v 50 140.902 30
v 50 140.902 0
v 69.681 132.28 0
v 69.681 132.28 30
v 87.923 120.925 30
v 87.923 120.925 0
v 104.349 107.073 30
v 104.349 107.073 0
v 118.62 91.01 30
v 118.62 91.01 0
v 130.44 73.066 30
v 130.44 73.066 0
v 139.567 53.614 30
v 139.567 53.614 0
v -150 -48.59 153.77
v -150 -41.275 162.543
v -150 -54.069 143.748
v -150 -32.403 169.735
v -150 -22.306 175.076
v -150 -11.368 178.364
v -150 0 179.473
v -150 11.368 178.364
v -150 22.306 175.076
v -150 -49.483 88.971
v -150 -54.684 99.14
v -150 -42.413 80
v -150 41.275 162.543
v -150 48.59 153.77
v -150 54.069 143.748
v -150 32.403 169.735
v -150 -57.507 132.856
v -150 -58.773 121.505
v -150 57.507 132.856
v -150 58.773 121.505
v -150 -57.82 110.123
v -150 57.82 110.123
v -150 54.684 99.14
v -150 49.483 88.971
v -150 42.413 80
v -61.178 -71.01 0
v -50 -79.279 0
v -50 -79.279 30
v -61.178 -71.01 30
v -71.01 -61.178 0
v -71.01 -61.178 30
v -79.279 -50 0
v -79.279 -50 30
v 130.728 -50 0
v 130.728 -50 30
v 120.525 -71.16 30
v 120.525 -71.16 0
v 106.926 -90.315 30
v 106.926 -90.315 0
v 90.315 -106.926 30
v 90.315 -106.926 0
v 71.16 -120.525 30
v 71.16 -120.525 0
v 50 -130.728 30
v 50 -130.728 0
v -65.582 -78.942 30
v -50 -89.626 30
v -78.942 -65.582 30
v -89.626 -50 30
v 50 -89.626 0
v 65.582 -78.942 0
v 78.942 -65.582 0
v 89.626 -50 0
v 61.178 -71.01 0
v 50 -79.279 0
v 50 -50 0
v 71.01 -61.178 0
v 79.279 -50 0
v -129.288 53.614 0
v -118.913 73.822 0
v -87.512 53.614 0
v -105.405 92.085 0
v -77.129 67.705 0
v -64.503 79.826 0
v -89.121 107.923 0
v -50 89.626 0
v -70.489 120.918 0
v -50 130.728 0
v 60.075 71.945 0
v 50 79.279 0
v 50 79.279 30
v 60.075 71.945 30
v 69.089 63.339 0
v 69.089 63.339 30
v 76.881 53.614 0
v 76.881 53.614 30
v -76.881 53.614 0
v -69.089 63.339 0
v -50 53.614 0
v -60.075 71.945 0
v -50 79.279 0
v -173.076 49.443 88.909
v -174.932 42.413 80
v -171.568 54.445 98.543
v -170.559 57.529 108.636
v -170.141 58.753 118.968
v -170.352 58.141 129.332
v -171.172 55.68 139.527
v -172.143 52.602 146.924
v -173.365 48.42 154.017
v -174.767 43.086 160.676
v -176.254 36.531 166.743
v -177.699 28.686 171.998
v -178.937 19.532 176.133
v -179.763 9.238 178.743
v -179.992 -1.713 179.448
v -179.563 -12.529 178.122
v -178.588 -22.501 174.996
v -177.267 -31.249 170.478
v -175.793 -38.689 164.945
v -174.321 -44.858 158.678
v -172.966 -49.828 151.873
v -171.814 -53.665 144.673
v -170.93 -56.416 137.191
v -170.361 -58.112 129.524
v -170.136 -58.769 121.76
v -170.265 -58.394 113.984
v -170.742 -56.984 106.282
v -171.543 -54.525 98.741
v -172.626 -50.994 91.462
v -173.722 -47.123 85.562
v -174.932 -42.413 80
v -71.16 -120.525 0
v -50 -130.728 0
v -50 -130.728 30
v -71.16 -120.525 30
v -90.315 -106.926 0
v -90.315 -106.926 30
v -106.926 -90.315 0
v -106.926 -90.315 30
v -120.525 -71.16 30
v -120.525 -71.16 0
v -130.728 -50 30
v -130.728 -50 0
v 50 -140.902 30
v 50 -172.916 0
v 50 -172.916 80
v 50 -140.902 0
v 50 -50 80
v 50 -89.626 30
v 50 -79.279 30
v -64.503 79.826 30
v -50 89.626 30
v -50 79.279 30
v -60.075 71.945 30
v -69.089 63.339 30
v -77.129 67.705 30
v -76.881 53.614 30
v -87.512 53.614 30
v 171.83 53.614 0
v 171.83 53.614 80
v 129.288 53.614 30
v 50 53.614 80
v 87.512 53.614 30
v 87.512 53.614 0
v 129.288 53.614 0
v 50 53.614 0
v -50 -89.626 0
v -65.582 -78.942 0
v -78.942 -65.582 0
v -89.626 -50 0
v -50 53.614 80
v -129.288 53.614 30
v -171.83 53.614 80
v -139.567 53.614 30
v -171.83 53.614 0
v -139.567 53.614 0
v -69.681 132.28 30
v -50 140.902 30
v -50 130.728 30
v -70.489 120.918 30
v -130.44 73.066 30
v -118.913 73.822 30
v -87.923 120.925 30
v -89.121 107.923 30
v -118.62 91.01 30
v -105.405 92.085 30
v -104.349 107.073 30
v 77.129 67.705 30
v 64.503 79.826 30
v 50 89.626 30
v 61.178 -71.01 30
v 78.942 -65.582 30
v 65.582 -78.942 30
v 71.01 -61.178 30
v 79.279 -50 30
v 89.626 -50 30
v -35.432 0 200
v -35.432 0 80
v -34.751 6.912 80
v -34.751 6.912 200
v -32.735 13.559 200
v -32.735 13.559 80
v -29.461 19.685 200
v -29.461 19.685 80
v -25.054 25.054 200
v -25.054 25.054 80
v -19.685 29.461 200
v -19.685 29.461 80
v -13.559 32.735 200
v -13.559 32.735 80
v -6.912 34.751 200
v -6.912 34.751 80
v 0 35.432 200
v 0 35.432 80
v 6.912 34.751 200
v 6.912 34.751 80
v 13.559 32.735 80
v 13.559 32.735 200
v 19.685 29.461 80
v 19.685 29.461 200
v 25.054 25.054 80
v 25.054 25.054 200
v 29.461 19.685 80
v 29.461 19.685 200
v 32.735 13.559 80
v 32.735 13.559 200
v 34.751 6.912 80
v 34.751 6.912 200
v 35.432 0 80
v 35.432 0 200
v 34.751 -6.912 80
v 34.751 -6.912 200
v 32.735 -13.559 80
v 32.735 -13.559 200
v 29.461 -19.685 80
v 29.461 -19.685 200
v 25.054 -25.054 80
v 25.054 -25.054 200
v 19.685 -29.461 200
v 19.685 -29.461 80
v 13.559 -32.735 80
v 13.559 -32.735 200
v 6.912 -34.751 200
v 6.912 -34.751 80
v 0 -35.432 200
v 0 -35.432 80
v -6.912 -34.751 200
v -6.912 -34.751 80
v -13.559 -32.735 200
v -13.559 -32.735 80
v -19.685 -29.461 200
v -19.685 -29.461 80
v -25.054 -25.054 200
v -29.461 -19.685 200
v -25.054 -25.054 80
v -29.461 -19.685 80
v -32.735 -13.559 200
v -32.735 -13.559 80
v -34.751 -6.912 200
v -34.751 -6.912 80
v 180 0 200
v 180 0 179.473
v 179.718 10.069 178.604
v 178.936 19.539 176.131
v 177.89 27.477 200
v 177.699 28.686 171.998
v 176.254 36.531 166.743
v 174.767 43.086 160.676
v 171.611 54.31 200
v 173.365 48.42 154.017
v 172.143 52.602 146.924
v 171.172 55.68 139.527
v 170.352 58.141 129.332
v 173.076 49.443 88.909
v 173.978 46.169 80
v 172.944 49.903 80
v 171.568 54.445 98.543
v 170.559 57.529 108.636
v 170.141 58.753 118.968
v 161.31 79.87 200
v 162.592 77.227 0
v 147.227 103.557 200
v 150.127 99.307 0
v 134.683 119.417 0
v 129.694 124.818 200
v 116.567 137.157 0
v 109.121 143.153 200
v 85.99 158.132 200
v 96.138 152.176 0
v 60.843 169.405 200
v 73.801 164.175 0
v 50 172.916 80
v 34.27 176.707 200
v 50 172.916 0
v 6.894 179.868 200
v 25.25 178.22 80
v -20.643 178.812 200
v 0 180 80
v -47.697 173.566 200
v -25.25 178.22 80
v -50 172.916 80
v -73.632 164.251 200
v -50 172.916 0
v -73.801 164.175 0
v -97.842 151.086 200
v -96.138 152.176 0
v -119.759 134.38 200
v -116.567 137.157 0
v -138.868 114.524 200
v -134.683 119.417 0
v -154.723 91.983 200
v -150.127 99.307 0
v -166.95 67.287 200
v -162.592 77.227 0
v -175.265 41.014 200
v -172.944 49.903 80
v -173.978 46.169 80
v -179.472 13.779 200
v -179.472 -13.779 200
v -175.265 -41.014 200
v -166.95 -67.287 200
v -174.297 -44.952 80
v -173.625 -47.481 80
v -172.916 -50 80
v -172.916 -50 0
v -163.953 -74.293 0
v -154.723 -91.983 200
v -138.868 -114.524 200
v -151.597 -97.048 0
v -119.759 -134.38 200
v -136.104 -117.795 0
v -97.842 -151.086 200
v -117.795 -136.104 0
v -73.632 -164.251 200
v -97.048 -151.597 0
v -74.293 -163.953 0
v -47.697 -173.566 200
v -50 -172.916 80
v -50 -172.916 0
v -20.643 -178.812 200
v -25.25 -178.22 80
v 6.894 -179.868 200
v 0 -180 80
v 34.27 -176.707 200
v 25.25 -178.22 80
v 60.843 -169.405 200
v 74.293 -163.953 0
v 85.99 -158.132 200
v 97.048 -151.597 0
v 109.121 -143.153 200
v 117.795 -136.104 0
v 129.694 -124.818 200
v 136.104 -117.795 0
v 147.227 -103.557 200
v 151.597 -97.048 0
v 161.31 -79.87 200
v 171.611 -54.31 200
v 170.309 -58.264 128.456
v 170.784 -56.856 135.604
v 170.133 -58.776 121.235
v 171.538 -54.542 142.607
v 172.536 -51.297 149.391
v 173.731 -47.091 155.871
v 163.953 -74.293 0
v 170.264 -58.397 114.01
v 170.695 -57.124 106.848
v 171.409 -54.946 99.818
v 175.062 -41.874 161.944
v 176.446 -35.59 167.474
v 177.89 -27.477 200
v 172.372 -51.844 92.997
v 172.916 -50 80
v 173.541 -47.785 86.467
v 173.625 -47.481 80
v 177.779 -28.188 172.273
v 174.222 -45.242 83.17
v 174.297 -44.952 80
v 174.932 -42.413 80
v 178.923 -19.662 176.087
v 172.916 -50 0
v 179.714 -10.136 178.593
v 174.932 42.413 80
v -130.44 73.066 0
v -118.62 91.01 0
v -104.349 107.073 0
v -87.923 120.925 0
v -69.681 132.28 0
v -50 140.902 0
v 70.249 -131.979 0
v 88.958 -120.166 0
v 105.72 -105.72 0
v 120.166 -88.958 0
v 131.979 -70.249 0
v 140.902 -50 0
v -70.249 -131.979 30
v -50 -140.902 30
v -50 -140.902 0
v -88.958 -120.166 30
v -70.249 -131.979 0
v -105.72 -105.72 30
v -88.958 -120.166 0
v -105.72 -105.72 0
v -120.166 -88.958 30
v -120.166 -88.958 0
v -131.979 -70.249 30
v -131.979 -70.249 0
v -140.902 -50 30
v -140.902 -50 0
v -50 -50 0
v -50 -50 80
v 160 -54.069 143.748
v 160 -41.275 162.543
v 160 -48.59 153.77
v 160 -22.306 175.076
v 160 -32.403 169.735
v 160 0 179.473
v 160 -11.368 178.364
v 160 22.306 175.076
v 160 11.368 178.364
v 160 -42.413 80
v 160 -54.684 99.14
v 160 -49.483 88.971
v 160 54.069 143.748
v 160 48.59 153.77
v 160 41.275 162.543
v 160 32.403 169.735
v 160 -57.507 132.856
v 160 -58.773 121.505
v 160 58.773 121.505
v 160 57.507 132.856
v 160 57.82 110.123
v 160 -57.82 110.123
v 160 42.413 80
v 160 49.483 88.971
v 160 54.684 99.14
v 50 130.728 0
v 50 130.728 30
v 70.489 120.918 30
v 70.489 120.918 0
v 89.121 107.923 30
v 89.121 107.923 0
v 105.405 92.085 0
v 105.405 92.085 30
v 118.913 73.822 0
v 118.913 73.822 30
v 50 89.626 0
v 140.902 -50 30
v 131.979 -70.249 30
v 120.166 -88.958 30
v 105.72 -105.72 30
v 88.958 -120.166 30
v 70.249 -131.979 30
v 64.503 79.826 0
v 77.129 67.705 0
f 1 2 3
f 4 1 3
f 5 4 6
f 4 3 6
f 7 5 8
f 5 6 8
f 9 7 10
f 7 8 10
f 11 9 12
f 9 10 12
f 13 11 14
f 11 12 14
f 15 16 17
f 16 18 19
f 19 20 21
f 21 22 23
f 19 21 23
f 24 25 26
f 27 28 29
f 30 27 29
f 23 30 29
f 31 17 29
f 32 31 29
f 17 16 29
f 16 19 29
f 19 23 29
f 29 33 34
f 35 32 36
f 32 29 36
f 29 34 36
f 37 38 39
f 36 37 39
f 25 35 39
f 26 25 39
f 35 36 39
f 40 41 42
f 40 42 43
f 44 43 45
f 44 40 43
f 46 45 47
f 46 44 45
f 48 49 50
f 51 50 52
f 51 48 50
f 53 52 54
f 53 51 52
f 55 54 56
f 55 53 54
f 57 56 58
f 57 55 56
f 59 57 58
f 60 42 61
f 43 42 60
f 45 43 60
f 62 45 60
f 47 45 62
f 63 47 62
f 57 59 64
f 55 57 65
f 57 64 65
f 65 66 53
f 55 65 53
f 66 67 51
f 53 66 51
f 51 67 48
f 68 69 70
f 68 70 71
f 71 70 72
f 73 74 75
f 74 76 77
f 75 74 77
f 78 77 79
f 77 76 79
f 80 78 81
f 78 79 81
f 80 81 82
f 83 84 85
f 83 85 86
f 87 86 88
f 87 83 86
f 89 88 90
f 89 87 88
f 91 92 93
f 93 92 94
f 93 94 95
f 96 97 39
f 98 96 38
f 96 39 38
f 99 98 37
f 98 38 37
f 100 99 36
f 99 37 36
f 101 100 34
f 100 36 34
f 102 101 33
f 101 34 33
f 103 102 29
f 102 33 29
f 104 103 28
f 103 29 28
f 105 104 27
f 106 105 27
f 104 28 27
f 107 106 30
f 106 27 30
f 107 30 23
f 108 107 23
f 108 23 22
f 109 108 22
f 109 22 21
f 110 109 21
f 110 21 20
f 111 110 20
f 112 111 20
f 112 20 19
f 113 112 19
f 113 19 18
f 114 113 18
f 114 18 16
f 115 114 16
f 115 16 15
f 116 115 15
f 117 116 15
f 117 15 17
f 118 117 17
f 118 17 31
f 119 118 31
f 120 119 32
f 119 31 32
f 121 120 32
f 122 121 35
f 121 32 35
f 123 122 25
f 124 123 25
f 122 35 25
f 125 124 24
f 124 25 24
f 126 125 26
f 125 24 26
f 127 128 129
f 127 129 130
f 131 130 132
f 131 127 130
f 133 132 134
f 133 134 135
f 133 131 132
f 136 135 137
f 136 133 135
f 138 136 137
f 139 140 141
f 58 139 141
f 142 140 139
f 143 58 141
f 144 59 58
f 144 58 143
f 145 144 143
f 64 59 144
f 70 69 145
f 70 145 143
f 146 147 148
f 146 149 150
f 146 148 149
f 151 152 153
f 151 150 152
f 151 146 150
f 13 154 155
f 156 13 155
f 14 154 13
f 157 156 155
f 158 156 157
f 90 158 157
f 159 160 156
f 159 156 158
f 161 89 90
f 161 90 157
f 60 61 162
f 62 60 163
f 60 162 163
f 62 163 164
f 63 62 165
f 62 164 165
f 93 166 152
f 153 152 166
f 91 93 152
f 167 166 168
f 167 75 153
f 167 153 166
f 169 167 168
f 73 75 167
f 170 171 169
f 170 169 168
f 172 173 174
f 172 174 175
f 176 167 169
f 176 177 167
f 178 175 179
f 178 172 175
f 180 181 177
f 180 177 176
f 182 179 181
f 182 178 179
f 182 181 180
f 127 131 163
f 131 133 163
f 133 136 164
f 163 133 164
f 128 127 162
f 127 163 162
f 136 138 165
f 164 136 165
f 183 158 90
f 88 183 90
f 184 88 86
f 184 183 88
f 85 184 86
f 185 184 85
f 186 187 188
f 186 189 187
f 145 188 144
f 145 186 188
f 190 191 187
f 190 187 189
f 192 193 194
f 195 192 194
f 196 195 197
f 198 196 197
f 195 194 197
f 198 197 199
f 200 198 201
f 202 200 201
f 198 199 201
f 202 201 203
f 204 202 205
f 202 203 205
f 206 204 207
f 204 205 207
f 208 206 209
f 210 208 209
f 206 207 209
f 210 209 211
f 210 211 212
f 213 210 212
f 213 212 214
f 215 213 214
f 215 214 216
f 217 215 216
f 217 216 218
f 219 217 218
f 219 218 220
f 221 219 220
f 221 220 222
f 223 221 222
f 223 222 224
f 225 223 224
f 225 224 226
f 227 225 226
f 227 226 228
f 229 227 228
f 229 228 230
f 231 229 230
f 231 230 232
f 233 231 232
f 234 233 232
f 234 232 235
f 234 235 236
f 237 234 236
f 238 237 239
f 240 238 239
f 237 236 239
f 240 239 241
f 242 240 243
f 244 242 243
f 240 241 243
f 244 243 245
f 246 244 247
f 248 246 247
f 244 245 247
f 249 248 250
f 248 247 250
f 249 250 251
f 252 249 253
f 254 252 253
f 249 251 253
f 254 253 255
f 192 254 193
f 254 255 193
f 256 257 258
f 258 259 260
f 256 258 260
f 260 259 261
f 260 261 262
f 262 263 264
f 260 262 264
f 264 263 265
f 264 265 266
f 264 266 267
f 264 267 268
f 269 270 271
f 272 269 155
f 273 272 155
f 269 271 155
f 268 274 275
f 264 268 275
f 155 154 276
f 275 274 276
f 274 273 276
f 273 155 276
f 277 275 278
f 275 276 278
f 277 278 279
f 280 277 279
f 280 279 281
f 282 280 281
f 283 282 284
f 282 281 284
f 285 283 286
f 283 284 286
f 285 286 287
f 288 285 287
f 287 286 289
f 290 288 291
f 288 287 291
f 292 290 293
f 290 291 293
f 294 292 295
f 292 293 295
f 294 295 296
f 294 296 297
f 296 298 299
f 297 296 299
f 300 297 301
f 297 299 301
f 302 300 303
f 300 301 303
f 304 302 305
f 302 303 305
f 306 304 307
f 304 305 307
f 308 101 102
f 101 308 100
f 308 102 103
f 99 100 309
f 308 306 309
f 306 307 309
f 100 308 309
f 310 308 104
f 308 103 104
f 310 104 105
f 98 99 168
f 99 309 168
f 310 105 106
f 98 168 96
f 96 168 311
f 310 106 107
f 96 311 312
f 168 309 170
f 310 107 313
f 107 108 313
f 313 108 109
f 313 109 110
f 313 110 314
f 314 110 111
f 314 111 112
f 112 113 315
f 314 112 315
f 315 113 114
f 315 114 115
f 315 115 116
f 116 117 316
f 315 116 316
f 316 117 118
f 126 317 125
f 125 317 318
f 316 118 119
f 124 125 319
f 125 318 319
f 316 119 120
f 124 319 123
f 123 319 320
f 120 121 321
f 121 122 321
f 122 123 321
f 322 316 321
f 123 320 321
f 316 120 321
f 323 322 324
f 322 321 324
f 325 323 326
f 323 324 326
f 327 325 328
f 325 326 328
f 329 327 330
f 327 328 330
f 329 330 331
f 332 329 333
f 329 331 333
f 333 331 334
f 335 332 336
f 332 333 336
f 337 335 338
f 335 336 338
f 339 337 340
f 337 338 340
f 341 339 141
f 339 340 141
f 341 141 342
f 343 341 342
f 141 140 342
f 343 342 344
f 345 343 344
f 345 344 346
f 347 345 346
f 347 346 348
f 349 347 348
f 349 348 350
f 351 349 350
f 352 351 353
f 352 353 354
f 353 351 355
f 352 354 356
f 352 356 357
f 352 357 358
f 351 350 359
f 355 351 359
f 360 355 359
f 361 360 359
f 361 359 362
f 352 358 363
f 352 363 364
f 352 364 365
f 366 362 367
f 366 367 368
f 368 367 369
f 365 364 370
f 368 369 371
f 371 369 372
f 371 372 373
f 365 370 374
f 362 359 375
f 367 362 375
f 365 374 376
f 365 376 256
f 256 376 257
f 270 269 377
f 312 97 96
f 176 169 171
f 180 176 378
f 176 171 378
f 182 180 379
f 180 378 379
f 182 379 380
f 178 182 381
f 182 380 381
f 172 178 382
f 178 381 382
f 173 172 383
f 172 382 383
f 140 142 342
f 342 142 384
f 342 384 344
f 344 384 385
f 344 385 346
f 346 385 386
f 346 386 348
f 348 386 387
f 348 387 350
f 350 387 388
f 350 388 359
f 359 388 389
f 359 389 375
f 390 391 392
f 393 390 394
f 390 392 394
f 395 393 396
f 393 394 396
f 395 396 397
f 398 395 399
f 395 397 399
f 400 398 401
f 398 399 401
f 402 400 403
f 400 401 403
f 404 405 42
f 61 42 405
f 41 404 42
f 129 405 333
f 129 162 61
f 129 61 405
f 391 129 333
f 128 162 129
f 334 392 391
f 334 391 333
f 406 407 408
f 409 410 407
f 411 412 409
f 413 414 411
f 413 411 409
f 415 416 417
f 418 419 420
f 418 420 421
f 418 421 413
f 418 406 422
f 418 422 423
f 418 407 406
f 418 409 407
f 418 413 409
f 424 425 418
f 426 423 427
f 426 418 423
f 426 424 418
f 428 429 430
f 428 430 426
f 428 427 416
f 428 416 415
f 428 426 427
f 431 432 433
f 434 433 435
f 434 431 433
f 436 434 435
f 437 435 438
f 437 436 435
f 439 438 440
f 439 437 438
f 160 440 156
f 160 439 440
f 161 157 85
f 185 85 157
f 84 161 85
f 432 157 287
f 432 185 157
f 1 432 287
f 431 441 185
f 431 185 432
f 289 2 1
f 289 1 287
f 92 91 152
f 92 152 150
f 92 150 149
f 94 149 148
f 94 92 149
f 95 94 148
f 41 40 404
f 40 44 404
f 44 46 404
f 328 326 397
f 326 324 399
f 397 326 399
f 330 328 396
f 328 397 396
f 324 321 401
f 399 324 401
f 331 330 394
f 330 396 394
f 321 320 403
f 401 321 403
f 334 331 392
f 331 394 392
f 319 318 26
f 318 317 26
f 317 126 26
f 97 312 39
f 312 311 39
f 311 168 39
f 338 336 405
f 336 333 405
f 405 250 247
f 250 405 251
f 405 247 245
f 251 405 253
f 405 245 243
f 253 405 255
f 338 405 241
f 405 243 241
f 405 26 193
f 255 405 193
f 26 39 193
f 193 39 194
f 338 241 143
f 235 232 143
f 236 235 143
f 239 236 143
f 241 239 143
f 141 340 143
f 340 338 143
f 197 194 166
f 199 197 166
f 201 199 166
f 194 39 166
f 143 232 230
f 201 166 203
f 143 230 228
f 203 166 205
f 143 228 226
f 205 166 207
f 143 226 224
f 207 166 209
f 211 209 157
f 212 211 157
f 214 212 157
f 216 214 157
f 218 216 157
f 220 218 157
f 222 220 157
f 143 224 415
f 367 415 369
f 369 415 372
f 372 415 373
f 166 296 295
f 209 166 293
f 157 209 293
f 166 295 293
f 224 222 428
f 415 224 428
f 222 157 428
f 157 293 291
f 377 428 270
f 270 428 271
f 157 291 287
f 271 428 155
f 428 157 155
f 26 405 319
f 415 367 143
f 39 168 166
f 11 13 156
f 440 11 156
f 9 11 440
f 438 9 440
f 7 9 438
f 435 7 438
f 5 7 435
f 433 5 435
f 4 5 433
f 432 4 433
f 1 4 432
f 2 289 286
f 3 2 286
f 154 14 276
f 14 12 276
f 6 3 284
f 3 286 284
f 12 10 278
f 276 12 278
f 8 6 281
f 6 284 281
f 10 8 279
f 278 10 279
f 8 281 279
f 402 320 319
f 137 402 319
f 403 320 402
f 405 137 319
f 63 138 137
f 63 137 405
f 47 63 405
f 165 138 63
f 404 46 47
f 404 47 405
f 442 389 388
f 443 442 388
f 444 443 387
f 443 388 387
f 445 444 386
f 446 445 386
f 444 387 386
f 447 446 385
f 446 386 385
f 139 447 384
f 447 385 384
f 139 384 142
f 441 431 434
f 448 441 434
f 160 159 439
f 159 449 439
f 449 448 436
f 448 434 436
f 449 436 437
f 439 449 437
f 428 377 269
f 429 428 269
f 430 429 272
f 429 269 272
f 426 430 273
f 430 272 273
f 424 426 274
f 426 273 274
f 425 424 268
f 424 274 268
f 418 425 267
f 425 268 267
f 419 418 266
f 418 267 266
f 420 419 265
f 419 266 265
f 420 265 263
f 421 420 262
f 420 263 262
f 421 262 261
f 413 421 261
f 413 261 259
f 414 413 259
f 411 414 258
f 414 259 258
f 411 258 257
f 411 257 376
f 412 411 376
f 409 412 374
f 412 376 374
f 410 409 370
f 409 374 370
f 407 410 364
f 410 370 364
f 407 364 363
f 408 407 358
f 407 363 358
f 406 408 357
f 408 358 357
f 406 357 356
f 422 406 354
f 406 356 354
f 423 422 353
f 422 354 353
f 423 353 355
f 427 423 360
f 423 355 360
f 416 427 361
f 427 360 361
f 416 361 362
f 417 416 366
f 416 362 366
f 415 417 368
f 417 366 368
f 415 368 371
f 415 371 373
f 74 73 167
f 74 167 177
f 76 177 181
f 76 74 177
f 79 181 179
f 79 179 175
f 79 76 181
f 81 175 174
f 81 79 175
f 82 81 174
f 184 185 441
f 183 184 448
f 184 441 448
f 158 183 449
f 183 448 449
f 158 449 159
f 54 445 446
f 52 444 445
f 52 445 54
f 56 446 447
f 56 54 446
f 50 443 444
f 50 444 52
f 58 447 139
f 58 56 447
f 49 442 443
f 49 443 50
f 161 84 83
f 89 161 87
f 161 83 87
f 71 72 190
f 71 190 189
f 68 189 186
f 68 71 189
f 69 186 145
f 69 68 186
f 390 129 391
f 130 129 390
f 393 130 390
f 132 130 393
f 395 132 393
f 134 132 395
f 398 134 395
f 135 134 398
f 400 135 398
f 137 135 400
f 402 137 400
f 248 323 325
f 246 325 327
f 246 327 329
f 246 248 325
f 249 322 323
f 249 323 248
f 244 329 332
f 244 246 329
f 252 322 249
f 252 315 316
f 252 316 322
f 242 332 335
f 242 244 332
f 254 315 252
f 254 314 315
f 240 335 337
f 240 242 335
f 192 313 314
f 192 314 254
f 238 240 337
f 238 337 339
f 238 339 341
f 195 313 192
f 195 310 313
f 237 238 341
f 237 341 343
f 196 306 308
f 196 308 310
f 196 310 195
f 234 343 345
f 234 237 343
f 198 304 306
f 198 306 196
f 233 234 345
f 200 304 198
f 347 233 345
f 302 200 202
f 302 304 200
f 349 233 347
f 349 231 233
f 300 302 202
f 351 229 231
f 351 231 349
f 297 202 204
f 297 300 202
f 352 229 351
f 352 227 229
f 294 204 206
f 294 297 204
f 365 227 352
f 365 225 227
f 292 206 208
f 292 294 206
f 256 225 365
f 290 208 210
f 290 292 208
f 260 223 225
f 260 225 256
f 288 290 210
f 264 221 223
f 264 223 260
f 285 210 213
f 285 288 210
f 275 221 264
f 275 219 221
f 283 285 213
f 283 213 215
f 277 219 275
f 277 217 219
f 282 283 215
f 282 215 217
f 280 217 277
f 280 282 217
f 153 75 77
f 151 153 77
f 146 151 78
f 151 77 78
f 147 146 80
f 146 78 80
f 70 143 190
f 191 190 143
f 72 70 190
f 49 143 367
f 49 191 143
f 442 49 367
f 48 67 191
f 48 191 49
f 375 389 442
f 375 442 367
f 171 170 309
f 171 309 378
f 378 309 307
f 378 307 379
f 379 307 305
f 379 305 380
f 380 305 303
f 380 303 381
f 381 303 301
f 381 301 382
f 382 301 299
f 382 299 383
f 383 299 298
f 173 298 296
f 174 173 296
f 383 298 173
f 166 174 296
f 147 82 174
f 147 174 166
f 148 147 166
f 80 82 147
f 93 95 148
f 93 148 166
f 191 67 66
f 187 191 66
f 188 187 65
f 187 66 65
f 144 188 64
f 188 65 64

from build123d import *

# Parameters (mm, degrees)
SKETCH1_R           = 180
BOSS_EXTRUDE1_DEPTH = 200
CUT_EXTRUDE1_DEPTH  = 80
SKETCH6_R           = 35.432069659
CUT_EXTRUDE4_DEPTH  = 201
SKETCH7_R           = 149.510464434
SKETCH7_R_2         = 139.963931463
SKETCH7_R_3         = 102.629519035
SKETCH7_R_4         = 93.728776548
CUT_EXTRUDE6_DEPTH  = 30
CUT_EXTRUDE7_START  = 190
SKETCH8_R           = 58.778682825
CUT_EXTRUDE7_DEPTH  = 30
CUT_EXTRUDE8_START  = -150
SKETCH9_R           = 58.778682825
CUT_EXTRUDE8_DEPTH  = 236


with BuildPart() as part:
    # Sketch1 → Boss-Extrude1 (new body)
    with BuildSketch(Plane.XY):
        Circle(SKETCH1_R)
    extrude(amount=BOSS_EXTRUDE1_DEPTH)

    # Sketch2 → Cut-Extrude1 (cut)
    with BuildSketch(Plane(origin=(0, 0, 0), x_dir=(-1, 0, 0), z_dir=(0, 0, -1))):
        Polygon((50, -50), (50, -249.832537204), (-50, -249.832537204), (-50, -50), (-236.119265231, -50), (-236.119265231, 53.613723388), (-50, 53.613723388), (-50, 228.035589712), (50, 228.035589712), (50, 53.613723388), (294.314355645, 53.613723388), (294.314355645, -50), align=None)
    extrude(amount=-CUT_EXTRUDE1_DEPTH, mode=Mode.SUBTRACT)

    # Sketch6 → Cut-Extrude4 (cut, through all)
    with BuildSketch(Plane(origin=(0, 0, 0), x_dir=(-1, 0, 0), z_dir=(0, 0, -1))):
        Circle(SKETCH6_R)
    extrude(amount=-CUT_EXTRUDE4_DEPTH, mode=Mode.SUBTRACT)

    # Sketch7 → Cut-Extrude6 (cut)
    with BuildSketch(Plane(origin=(0, 0, 0), x_dir=(-1, 0, 0), z_dir=(0, 0, -1))):
        Circle(SKETCH7_R)
        Circle(SKETCH7_R_2, mode=Mode.SUBTRACT)
        Circle(SKETCH7_R_3)
        Circle(SKETCH7_R_4, mode=Mode.SUBTRACT)
    extrude(amount=-CUT_EXTRUDE6_DEPTH, mode=Mode.SUBTRACT)

    # Sketch8 → Cut-Extrude7 (cut)
    with BuildSketch(Plane(origin=(0, 0, 0), x_dir=(0, 0, -1), z_dir=(1, 0, 0)).offset(CUT_EXTRUDE7_START)):
        with Locations((-120.694647065, 0)):
            Circle(SKETCH8_R)
    extrude(amount=-CUT_EXTRUDE7_DEPTH, mode=Mode.SUBTRACT)

    # Sketch9 → Cut-Extrude8 (cut)
    with BuildSketch(Plane(origin=(0, 0, 0), x_dir=(0, 0, -1), z_dir=(1, 0, 0)).offset(CUT_EXTRUDE8_START)):
        with Locations((-120.694647065, 0)):
            Circle(SKETCH9_R)
    extrude(amount=-CUT_EXTRUDE8_DEPTH, mode=Mode.SUBTRACT)


solid = part.part
